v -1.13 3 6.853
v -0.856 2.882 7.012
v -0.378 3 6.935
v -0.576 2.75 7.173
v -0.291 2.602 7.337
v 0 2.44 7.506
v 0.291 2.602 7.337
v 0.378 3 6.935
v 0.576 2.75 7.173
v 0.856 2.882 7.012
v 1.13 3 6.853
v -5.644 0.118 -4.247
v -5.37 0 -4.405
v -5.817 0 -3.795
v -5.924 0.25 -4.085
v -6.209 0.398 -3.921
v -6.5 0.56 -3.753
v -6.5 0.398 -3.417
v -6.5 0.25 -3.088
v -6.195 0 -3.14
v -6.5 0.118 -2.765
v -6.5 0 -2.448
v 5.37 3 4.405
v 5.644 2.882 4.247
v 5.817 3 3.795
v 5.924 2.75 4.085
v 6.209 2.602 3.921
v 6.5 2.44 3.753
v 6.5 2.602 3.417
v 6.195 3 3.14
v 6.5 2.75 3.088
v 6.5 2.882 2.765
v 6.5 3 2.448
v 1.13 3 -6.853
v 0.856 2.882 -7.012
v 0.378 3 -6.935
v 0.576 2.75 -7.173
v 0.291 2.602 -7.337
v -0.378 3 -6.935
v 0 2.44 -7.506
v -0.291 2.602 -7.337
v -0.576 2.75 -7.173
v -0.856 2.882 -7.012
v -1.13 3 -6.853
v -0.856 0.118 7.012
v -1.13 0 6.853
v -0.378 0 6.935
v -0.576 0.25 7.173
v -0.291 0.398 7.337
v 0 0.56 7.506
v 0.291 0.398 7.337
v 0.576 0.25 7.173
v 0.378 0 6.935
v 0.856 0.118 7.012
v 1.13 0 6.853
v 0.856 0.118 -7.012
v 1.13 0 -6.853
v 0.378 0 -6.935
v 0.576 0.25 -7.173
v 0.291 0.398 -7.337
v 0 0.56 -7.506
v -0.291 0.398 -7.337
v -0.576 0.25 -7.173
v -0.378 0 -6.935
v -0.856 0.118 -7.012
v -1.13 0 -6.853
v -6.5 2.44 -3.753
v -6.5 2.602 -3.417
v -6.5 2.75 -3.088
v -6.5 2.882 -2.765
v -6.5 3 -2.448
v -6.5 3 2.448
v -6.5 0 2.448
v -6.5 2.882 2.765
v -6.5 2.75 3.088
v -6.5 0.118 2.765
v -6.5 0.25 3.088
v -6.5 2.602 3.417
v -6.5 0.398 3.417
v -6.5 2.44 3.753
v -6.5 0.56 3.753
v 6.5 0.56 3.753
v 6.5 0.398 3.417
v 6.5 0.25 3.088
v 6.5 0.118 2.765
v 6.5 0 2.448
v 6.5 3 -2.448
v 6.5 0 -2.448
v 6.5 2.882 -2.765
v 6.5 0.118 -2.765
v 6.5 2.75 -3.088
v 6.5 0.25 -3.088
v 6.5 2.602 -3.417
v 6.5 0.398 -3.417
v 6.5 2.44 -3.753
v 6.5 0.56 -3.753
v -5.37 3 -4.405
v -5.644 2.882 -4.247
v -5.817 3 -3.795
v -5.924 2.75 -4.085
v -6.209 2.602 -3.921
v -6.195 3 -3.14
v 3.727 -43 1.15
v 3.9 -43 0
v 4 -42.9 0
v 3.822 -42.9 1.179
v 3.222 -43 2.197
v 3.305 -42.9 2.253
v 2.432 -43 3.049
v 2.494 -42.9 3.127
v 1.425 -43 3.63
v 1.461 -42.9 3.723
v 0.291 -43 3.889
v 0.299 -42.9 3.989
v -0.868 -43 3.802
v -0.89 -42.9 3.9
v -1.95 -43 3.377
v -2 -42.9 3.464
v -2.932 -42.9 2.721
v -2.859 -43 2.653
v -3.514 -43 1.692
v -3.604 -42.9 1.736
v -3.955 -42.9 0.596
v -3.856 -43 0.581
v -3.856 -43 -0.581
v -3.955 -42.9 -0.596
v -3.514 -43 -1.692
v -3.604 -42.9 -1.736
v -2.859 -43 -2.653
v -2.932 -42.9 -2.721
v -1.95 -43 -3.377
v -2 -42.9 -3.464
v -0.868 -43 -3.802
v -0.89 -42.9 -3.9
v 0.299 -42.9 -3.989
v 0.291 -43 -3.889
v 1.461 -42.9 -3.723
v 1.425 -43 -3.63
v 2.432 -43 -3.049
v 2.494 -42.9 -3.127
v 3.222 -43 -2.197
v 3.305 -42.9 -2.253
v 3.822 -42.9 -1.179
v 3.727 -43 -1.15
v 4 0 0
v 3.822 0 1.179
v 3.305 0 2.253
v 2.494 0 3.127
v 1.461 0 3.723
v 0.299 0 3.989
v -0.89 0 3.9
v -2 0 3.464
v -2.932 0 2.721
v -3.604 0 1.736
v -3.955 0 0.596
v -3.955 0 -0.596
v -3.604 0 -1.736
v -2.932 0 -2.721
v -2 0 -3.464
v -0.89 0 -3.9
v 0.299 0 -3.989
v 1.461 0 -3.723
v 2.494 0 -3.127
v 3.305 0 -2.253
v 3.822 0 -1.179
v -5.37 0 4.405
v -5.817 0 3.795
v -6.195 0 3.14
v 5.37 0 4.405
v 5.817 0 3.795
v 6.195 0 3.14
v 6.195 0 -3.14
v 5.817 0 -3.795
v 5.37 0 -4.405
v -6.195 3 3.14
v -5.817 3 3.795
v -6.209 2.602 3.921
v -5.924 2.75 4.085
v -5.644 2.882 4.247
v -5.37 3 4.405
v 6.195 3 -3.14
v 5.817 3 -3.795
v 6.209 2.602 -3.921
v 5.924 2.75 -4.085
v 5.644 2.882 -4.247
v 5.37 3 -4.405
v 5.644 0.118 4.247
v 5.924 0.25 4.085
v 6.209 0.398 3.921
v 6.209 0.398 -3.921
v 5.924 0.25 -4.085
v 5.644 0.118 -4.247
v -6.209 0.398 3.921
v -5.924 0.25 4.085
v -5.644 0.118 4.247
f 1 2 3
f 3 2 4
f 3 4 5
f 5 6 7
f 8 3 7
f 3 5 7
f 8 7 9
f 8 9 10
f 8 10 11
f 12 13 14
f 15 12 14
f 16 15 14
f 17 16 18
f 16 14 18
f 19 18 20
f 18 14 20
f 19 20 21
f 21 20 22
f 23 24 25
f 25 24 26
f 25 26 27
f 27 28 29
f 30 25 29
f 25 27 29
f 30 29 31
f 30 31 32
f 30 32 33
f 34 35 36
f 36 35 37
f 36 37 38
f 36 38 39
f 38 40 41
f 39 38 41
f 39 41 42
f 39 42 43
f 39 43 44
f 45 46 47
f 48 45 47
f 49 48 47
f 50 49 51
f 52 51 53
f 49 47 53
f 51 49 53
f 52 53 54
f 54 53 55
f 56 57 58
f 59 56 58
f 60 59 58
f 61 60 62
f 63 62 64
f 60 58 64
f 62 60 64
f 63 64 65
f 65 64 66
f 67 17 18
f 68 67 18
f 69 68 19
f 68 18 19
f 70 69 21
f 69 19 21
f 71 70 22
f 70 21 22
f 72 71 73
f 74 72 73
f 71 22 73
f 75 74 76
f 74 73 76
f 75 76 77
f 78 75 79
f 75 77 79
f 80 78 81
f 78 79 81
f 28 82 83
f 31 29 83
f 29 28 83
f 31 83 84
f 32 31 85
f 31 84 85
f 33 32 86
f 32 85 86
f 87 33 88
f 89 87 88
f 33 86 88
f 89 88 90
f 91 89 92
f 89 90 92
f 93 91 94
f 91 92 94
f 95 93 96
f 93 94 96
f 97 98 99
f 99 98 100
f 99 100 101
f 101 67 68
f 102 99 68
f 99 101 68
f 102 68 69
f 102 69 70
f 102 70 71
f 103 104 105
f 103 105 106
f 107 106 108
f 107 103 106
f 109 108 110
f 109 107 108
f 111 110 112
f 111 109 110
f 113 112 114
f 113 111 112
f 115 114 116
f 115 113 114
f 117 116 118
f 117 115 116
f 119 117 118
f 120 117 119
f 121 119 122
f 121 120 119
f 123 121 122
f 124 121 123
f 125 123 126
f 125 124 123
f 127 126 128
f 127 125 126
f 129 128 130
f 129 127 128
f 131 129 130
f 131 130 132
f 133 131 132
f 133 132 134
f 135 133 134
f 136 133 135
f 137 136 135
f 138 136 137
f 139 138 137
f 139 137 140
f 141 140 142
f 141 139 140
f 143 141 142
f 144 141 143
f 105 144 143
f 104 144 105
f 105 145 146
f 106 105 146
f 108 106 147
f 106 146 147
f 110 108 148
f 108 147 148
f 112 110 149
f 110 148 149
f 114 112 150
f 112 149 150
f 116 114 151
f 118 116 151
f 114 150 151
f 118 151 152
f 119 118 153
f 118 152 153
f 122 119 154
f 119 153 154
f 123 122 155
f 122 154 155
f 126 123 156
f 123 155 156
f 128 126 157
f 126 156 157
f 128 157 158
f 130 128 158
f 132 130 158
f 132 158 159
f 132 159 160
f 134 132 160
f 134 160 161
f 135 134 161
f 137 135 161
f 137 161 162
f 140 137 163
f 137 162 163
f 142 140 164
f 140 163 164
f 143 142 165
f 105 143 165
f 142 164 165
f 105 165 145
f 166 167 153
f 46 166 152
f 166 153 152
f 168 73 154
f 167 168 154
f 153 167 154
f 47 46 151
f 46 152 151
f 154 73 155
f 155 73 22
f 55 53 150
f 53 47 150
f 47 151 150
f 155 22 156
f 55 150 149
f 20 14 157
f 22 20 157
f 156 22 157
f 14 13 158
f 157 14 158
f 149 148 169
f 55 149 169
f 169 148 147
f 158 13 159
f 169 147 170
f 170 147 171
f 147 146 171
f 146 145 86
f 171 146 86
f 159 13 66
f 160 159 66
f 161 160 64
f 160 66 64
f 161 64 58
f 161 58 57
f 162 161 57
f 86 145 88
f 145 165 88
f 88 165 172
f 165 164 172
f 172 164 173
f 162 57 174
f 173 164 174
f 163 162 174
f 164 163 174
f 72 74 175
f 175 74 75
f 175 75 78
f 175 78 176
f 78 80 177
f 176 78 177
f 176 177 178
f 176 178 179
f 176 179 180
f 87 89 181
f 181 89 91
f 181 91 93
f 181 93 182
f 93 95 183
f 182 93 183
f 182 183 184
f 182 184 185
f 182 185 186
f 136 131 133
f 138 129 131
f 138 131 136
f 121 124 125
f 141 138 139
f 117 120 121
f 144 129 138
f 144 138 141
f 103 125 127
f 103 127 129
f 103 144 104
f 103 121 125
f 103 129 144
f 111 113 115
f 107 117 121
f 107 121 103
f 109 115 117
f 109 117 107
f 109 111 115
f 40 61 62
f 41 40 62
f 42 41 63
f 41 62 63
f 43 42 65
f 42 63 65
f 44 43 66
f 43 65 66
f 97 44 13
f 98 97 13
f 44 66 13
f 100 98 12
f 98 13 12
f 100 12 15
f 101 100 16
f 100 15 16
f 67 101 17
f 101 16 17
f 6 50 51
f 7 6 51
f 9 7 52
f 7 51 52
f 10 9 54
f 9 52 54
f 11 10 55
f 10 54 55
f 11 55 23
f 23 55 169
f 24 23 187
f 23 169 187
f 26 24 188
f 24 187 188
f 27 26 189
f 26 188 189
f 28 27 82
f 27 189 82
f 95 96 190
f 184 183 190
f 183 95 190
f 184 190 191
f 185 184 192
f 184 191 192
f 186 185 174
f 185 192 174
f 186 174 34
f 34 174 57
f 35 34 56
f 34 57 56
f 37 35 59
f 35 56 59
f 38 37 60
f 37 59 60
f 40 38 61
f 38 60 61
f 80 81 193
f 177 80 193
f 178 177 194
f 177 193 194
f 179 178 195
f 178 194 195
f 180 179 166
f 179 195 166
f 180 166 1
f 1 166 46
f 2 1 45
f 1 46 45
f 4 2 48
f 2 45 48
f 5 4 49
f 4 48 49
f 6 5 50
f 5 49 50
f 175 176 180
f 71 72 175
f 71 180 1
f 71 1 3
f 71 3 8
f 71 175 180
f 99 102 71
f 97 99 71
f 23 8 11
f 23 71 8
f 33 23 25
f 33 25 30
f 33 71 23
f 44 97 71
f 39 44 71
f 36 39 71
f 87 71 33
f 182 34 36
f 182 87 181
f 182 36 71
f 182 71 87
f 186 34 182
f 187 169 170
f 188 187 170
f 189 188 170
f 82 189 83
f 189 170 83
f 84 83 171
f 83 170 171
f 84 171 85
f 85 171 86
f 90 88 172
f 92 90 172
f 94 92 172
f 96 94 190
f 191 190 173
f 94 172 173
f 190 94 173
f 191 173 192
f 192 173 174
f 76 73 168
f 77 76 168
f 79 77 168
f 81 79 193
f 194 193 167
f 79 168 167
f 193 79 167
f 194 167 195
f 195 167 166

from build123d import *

# Parameters (mm, degrees)
EXTRUDE_1_DEPTH = 3
SKETCH_2_R      = 4
EXTRUDE_2_DEPTH = 43
CHAMFER_1_SIZE  = 0.1


with BuildPart() as part:
    # 草图1 → 凸台-拉伸1 (new body)
    with BuildSketch(Plane(origin=(0, 0, 0), x_dir=(1, 0, 0), z_dir=(0, 1, 0))):
        Polygon((0, 7.505553499), (-6.5, 3.75277675), (-6.5, -3.75277675), (0, -7.505553499), (6.5, -3.75277675), (6.5, 3.75277675), align=None)
    extrude(amount=EXTRUDE_1_DEPTH)

    # 草图2 → 凸台-拉伸2 (add)
    with BuildSketch(Plane.XZ):
        Circle(SKETCH_2_R)
    extrude(amount=EXTRUDE_2_DEPTH)

    # 倒角1
    chamfer_1_edges = [part.edges().sort_by_distance(p)[0] for p in [
        (-4, -43, 0),
    ]]
    chamfer(chamfer_1_edges, length=CHAMFER_1_SIZE)

    # 草图5 → 切除-旋转2 (revolve, cut)
    with BuildSketch(Plane(origin=(0, 0, 0), x_dir=(0, 0, -1), z_dir=(1, 0, 0))):
        Polygon((-6.945553499, 3), (-7.505553499, 2.44), (-7.505553499, 3), align=None)
        Polygon((-7.505553499, 0), (-7.505553499, 0.56), (-6.945553499, 0), align=None)
    revolve(axis=Axis((0, 3, 0), (0, 1, 0)), mode=Mode.SUBTRACT)


solid = part.part
